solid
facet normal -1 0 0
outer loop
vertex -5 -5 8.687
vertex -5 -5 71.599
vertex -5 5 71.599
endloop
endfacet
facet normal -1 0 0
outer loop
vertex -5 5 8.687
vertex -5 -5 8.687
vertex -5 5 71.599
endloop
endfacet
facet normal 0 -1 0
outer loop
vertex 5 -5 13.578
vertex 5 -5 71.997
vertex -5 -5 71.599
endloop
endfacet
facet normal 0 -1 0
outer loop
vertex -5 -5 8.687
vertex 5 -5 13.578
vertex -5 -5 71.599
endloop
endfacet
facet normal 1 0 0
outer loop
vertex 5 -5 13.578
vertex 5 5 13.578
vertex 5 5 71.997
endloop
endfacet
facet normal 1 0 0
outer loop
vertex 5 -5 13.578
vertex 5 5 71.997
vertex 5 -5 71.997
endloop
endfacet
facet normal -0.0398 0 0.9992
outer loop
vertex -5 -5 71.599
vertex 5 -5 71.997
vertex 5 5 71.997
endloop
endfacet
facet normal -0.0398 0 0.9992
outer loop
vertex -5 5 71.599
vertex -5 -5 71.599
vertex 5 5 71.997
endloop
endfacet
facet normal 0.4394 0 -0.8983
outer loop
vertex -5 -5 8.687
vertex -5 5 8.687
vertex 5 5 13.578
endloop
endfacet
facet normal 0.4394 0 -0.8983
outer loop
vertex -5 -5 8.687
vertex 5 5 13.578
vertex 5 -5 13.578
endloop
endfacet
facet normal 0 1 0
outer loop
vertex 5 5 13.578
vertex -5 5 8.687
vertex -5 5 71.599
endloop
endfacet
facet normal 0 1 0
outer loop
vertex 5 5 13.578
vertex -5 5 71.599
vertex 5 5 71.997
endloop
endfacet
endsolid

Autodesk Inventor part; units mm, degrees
ref_plane "Start Plane" through (0, 0, 8.6865) normal (0, 0, 1) x (1, 0, 0)
ref_plane "End Plane" through (0, 0, 71.9966) normal (0, 0, 1) x (1, 0, 0)
sketch "Sketch" plane through (0, 0, 0) normal (0, 0, 1) x (1, 0, 0)
  line L0 (5, -5) -> (-5, -5)
  line L1 (-5, -5) -> (-5, 5)
  line L2 (-5, 5) -> (5, 5)
  line L3 (5, 5) -> (5, -5)
  line L4 (-6, 0) -> (8, 0) construction
  line L5 (0, -30) -> (0, 40) construction
  line L6 (0, 54) -> (0, -44) construction
  line L7 (-9.2, 0) -> (13.2, 0) construction
  dimension "d0" = 10
  dimension "d1" = 10
  dimension "d4" = 5
  dimension "d5" = 5
extrude "Body" add sketch "Sketch" along normal up to surface (63.3101 mm away) from surface at 8.6865
sketch "Sketch3" plane through (0, 0, 0) normal (0, 0, 1) x (1, 0, 0)
  line L0 (0, 0) -> (10, 0)
ref_plane "Work Plane3" through (0, 0, 0) normal (0, -1, 0) x (1, 0, 0)
sketch "Sketch4" plane through (0, 0, 0) normal (0, -1, 0) x (1, 0, 0)
  line L0 (-2, 8.6865) -> (12, 8.6865)
  line L1 (-2, 71.9966) -> (12, 71.9966)
  dimension "d9" = 63.3101
ref_plane "Work Plane5" through (1.8939, -115, 12.0587) normal (0.4394, 0, -0.8983) x (-0.8983, 0, -0.4394)
split "Split2" plane through (1.8939, -115, 12.0587) removes the side toward (0.4394, 0, -0.8983)
ref_plane "Work Plane6" through (-0.1986, 5, 71.79) normal (-0.0397, 0, 0.9992) x (0.9992, 0, 0.0397)
split "Split3" plane through (-0.1986, 5, 71.79) removes the side toward (-0.0397, 0, 0.9992)
equation "\"d0\" = G_W"
equation "\"d1\" = G_H"
equation "\"d4\" = 0.5 * d1"
equation "\"d5\" = 0.5 * d0"
equation "\"d2\" = G_L"
equation "\"G_W\" = 10"
equation "\"G_H\" = 10"
equation "\"G_L\" = d9"
equation "\"G_OFFSET_START\" = -8.68648"
equation "\"G_OFFSET_END\" = 5.20268"
equation "\"d6\" = -G_OFFSET_START"
equation "\"d7\" = G_OFFSET_END + B_L"
equation "\"B_L\" = 66.7939"
properties part number "ISO 1035/2 - 10 x 10 - 63.31" material "Steel, Mild"
